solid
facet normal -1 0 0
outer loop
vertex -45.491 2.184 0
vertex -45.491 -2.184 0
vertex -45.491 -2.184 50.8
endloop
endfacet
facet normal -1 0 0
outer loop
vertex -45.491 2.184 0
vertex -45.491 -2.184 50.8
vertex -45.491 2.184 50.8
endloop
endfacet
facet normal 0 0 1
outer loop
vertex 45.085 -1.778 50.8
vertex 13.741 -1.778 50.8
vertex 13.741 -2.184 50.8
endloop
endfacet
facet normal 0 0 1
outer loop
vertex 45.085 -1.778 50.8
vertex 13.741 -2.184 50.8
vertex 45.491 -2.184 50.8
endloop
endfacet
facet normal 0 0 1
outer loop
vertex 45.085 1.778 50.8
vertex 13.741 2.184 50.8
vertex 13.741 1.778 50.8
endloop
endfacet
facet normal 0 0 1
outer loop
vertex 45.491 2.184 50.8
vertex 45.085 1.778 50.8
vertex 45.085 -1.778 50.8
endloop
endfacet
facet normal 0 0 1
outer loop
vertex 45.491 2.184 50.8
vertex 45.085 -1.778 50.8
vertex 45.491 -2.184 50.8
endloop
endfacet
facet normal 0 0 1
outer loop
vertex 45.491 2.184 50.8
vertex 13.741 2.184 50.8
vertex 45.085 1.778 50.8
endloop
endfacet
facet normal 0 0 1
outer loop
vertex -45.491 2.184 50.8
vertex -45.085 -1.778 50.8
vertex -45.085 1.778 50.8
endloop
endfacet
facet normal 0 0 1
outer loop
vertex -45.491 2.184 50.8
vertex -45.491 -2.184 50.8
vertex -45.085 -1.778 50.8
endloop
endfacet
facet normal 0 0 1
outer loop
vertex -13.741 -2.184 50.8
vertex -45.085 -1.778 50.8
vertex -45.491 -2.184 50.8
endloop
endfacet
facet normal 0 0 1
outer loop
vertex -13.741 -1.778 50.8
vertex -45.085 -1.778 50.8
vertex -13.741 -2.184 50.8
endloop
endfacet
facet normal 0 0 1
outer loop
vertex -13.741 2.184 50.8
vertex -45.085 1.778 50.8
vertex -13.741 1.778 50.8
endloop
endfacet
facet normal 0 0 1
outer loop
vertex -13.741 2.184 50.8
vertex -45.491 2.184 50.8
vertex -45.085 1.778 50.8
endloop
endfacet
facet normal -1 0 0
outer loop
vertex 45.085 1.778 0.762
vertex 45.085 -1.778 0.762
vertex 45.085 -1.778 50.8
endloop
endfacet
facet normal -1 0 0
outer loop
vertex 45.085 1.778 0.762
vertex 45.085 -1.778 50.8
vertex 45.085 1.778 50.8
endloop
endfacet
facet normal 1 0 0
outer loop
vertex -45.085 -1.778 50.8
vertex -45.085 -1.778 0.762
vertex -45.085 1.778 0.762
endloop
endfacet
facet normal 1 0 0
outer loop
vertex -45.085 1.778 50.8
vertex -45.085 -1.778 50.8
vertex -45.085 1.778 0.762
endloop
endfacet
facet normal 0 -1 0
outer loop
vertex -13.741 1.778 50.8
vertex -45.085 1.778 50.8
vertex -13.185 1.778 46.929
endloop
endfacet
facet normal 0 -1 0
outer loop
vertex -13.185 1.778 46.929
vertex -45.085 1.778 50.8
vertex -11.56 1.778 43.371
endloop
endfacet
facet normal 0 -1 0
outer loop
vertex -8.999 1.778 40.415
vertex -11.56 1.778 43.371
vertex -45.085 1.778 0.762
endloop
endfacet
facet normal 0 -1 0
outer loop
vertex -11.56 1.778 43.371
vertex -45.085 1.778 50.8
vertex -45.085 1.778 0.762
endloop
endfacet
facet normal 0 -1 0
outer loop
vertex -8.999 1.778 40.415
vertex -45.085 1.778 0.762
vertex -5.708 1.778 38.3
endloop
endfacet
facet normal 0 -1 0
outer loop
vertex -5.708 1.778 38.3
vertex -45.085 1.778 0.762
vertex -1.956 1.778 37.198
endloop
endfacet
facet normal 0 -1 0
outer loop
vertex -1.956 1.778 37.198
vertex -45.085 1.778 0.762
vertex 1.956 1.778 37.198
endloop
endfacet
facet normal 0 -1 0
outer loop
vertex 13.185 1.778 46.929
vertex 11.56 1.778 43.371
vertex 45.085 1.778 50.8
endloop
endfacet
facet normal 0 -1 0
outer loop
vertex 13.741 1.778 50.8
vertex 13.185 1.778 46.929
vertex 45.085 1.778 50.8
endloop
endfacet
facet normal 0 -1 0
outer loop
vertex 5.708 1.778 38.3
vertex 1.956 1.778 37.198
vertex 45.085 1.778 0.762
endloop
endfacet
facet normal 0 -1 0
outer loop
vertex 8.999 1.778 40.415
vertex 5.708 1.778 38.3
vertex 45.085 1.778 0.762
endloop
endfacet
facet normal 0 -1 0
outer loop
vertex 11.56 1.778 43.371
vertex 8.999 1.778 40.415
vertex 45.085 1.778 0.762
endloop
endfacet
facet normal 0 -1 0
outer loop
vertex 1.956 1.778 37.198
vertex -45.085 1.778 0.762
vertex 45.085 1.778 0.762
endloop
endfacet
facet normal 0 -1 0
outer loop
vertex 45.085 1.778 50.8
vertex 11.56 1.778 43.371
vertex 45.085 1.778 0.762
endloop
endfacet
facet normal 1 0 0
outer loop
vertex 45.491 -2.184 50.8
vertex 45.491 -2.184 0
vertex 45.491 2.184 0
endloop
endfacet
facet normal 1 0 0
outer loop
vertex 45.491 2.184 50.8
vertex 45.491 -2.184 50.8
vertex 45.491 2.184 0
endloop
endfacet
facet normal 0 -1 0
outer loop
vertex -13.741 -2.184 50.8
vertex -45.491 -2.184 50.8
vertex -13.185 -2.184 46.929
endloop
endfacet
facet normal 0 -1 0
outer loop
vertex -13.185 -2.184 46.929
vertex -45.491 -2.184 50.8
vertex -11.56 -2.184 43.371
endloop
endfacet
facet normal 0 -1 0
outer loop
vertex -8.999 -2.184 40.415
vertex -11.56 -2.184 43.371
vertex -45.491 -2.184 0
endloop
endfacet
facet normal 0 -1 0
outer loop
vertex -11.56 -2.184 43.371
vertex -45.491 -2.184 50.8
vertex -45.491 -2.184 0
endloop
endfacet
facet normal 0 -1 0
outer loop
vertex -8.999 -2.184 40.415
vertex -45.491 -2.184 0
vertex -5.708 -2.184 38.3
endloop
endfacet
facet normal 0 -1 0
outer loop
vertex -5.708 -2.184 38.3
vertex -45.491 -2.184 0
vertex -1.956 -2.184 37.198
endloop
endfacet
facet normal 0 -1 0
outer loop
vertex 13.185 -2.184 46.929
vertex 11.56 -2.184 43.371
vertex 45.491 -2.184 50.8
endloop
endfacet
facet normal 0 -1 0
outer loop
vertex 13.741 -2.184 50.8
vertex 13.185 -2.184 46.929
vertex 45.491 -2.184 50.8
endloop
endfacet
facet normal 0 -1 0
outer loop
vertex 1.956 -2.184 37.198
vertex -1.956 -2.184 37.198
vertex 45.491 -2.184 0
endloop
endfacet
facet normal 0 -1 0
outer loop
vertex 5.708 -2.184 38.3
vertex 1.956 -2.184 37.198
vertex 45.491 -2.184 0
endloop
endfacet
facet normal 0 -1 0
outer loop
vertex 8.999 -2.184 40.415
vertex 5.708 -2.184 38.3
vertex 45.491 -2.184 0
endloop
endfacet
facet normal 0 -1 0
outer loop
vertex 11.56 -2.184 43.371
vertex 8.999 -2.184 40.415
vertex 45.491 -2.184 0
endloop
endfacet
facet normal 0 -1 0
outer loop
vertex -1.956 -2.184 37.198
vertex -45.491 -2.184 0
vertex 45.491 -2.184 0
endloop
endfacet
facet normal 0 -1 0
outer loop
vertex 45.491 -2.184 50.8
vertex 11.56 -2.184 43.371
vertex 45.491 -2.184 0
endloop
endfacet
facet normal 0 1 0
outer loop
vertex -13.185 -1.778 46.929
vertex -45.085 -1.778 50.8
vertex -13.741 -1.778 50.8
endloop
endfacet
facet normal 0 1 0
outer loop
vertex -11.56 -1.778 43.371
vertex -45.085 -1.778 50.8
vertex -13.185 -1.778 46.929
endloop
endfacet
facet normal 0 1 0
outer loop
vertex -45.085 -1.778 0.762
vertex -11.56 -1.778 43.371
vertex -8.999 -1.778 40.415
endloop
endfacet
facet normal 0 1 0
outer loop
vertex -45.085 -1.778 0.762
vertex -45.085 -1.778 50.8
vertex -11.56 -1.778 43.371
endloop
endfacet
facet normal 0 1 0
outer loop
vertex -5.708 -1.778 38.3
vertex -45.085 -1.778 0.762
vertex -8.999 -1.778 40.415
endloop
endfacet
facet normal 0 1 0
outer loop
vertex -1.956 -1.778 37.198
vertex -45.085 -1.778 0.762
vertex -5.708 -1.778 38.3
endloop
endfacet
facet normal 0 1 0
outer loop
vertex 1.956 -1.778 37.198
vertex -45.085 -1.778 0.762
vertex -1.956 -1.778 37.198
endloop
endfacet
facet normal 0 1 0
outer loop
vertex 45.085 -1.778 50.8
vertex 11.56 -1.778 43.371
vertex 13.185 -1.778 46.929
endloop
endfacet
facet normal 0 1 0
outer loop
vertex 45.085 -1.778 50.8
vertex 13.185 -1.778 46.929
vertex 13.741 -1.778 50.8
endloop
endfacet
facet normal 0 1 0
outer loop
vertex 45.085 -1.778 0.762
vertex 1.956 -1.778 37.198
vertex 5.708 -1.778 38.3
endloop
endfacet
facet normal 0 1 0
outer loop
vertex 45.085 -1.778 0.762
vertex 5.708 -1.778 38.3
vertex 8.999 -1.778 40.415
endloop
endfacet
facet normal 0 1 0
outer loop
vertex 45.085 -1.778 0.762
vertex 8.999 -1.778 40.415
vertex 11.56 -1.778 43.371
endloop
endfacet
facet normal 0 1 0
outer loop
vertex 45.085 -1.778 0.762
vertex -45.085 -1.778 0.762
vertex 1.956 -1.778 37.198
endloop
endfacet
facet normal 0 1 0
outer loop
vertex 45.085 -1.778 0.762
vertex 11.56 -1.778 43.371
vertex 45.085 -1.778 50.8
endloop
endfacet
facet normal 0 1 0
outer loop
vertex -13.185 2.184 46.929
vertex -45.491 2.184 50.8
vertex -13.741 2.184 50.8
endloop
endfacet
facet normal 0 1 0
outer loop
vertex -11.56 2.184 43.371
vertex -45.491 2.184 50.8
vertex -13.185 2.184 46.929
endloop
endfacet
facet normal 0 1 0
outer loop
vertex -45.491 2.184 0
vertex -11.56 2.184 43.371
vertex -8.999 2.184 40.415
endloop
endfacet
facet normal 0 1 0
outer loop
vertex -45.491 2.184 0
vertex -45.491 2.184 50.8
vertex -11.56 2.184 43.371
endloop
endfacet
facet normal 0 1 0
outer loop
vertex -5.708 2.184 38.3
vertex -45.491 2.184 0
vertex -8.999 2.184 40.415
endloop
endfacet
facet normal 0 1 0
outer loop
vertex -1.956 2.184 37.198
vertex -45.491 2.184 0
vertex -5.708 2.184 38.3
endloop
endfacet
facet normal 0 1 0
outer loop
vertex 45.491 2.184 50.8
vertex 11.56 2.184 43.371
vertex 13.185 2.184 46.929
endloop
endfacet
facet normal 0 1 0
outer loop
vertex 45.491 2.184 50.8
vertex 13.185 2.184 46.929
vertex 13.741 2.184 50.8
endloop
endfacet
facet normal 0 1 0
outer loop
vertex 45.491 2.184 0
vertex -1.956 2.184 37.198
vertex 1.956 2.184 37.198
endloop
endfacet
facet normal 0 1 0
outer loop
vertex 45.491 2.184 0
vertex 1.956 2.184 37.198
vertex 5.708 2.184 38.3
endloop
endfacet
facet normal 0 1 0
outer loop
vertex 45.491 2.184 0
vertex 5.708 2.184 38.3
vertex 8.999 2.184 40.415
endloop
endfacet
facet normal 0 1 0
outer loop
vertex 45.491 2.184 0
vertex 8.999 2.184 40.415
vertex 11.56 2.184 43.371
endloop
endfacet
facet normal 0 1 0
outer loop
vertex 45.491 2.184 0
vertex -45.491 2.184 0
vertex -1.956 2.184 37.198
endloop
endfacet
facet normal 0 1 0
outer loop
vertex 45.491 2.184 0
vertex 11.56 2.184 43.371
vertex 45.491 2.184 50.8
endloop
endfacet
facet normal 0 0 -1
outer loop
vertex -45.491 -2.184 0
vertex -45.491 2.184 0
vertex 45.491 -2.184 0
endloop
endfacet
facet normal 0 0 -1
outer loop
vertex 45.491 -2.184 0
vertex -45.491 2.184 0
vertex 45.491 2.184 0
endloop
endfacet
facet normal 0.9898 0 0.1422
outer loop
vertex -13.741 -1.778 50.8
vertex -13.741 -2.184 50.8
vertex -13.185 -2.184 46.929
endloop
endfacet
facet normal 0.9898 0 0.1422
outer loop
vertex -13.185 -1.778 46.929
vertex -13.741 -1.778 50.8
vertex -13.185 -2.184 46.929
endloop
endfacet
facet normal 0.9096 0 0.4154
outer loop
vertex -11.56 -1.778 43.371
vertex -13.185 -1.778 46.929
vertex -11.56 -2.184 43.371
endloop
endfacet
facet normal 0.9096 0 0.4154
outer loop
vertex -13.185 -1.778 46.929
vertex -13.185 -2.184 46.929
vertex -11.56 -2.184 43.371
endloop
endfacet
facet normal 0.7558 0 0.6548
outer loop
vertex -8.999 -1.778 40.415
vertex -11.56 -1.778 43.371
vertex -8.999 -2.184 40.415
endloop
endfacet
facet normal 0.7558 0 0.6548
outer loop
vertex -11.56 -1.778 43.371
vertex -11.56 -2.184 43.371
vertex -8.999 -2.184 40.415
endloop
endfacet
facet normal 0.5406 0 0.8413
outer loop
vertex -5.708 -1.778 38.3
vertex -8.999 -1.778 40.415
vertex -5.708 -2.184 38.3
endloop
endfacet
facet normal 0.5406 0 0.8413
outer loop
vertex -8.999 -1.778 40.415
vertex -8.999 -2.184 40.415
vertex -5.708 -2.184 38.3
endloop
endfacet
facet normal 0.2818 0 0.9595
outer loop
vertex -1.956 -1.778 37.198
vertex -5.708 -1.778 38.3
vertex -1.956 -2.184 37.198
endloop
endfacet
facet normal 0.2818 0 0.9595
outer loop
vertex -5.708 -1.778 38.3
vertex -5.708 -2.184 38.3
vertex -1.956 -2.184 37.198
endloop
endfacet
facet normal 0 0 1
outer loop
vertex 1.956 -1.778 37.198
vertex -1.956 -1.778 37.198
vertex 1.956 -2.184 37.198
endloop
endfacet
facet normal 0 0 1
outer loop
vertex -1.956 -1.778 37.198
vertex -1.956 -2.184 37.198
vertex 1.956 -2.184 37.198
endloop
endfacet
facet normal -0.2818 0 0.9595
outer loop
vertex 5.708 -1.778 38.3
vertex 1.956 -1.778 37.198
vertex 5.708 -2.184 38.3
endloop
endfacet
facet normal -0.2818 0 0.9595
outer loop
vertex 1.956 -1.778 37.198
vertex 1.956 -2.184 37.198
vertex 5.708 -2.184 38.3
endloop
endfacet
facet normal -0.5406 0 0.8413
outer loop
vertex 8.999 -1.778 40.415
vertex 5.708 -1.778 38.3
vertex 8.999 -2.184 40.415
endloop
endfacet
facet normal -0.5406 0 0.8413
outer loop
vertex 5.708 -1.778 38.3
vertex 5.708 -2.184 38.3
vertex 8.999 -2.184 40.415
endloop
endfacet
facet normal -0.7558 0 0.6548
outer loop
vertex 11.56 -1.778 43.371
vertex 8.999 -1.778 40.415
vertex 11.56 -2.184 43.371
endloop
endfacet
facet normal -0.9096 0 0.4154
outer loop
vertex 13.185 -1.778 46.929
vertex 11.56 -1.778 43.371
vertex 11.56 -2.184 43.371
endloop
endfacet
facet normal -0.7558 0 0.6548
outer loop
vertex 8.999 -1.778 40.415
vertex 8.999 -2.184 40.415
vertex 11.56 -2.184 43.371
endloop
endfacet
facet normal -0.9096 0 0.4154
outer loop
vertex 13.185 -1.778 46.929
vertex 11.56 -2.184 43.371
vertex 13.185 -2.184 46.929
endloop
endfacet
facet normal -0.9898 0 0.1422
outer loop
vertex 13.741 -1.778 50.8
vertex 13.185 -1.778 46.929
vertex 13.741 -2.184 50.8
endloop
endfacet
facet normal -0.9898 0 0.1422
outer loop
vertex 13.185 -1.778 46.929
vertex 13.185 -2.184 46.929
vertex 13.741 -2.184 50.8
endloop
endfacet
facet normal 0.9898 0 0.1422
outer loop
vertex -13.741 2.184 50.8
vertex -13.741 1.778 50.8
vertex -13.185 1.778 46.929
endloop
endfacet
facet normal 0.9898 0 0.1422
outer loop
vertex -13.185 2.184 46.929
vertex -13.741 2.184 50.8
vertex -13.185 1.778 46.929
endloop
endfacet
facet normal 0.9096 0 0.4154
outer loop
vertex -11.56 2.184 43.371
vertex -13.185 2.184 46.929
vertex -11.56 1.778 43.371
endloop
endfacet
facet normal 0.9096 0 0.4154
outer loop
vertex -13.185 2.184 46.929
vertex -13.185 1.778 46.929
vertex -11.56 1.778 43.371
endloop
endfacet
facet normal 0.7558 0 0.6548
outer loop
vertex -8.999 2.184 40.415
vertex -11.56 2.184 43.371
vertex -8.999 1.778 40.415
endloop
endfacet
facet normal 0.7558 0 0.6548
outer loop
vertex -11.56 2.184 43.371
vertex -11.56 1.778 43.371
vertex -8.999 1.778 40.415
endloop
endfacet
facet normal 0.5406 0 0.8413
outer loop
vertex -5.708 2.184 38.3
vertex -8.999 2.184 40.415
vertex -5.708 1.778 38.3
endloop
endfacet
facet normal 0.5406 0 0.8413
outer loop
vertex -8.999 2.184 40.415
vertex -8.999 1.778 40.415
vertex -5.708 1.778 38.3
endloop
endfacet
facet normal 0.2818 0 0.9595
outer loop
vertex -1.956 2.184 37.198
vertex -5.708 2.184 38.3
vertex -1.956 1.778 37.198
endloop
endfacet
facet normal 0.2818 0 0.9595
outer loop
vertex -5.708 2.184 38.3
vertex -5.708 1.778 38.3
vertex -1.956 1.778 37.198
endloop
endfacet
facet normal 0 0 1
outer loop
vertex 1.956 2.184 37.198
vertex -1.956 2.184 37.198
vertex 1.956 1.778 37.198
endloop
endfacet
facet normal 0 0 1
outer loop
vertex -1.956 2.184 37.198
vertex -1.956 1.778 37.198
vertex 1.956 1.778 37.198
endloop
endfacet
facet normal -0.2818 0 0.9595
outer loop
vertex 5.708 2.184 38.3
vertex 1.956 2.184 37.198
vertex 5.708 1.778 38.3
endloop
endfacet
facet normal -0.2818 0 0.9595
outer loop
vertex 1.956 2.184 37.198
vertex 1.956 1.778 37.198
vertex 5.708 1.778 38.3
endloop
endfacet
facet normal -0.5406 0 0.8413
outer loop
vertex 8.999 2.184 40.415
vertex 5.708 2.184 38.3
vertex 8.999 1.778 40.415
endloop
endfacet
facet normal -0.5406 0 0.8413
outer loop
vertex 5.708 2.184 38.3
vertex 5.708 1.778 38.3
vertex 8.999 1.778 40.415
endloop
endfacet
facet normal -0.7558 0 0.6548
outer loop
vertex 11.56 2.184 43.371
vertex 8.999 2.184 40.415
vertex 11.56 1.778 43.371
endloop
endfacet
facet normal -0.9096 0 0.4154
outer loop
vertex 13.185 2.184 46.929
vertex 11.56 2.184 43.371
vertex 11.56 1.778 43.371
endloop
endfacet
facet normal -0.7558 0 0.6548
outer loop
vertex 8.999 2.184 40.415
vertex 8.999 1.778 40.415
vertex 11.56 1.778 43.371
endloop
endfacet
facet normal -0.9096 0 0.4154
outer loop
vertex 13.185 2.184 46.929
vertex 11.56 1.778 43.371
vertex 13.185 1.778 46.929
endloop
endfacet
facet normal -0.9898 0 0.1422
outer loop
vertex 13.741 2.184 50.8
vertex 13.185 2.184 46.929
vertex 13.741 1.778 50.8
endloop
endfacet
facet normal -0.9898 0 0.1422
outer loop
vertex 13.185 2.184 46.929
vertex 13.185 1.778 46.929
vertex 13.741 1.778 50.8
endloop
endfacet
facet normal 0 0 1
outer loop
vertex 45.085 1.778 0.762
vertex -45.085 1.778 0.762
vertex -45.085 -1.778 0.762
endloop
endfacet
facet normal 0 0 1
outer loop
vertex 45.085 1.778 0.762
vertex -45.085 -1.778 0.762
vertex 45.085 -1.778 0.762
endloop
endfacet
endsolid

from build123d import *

# Parameters (mm, degrees)
F0_W     = 90.9828
F0_H     = 4.3688
F0_W_2   = 90.17
F0_H_2   = 3.556
F1_DEPTH = 50.8
F2_DEPTH = 0.762
F4_DEPTH = 4.3698


with BuildPart() as f1:
    # F0 (on Top) → F1 (new body)
    with BuildSketch(Plane.XY):
        Rectangle(F0_W, F0_H)
        Rectangle(F0_W_2, F0_H_2, mode=Mode.SUBTRACT)
    extrude(amount=F1_DEPTH)

    # F0 (on Top) → F2 (join)
    with BuildSketch(Plane.XY):
        Rectangle(F0_W, F0_H)
        Rectangle(F0_W_2, F0_H_2, mode=Mode.SUBTRACT)
        Rectangle(F0_W_2, F0_H_2)
    extrude(amount=F2_DEPTH)

    # F3 (on face) → F4 (cut, through all)
    with BuildSketch(Plane.XZ.offset(2.1844)):
        with BuildLine():
            Line((13.7414, 50.8), (-13.7414, 50.8))
            ThreePointArc((-13.7414, 50.8), (0, 37.0586), (13.7414, 50.8))
        make_face()
    extrude(amount=-F4_DEPTH, mode=Mode.SUBTRACT)


solid = f1.part
